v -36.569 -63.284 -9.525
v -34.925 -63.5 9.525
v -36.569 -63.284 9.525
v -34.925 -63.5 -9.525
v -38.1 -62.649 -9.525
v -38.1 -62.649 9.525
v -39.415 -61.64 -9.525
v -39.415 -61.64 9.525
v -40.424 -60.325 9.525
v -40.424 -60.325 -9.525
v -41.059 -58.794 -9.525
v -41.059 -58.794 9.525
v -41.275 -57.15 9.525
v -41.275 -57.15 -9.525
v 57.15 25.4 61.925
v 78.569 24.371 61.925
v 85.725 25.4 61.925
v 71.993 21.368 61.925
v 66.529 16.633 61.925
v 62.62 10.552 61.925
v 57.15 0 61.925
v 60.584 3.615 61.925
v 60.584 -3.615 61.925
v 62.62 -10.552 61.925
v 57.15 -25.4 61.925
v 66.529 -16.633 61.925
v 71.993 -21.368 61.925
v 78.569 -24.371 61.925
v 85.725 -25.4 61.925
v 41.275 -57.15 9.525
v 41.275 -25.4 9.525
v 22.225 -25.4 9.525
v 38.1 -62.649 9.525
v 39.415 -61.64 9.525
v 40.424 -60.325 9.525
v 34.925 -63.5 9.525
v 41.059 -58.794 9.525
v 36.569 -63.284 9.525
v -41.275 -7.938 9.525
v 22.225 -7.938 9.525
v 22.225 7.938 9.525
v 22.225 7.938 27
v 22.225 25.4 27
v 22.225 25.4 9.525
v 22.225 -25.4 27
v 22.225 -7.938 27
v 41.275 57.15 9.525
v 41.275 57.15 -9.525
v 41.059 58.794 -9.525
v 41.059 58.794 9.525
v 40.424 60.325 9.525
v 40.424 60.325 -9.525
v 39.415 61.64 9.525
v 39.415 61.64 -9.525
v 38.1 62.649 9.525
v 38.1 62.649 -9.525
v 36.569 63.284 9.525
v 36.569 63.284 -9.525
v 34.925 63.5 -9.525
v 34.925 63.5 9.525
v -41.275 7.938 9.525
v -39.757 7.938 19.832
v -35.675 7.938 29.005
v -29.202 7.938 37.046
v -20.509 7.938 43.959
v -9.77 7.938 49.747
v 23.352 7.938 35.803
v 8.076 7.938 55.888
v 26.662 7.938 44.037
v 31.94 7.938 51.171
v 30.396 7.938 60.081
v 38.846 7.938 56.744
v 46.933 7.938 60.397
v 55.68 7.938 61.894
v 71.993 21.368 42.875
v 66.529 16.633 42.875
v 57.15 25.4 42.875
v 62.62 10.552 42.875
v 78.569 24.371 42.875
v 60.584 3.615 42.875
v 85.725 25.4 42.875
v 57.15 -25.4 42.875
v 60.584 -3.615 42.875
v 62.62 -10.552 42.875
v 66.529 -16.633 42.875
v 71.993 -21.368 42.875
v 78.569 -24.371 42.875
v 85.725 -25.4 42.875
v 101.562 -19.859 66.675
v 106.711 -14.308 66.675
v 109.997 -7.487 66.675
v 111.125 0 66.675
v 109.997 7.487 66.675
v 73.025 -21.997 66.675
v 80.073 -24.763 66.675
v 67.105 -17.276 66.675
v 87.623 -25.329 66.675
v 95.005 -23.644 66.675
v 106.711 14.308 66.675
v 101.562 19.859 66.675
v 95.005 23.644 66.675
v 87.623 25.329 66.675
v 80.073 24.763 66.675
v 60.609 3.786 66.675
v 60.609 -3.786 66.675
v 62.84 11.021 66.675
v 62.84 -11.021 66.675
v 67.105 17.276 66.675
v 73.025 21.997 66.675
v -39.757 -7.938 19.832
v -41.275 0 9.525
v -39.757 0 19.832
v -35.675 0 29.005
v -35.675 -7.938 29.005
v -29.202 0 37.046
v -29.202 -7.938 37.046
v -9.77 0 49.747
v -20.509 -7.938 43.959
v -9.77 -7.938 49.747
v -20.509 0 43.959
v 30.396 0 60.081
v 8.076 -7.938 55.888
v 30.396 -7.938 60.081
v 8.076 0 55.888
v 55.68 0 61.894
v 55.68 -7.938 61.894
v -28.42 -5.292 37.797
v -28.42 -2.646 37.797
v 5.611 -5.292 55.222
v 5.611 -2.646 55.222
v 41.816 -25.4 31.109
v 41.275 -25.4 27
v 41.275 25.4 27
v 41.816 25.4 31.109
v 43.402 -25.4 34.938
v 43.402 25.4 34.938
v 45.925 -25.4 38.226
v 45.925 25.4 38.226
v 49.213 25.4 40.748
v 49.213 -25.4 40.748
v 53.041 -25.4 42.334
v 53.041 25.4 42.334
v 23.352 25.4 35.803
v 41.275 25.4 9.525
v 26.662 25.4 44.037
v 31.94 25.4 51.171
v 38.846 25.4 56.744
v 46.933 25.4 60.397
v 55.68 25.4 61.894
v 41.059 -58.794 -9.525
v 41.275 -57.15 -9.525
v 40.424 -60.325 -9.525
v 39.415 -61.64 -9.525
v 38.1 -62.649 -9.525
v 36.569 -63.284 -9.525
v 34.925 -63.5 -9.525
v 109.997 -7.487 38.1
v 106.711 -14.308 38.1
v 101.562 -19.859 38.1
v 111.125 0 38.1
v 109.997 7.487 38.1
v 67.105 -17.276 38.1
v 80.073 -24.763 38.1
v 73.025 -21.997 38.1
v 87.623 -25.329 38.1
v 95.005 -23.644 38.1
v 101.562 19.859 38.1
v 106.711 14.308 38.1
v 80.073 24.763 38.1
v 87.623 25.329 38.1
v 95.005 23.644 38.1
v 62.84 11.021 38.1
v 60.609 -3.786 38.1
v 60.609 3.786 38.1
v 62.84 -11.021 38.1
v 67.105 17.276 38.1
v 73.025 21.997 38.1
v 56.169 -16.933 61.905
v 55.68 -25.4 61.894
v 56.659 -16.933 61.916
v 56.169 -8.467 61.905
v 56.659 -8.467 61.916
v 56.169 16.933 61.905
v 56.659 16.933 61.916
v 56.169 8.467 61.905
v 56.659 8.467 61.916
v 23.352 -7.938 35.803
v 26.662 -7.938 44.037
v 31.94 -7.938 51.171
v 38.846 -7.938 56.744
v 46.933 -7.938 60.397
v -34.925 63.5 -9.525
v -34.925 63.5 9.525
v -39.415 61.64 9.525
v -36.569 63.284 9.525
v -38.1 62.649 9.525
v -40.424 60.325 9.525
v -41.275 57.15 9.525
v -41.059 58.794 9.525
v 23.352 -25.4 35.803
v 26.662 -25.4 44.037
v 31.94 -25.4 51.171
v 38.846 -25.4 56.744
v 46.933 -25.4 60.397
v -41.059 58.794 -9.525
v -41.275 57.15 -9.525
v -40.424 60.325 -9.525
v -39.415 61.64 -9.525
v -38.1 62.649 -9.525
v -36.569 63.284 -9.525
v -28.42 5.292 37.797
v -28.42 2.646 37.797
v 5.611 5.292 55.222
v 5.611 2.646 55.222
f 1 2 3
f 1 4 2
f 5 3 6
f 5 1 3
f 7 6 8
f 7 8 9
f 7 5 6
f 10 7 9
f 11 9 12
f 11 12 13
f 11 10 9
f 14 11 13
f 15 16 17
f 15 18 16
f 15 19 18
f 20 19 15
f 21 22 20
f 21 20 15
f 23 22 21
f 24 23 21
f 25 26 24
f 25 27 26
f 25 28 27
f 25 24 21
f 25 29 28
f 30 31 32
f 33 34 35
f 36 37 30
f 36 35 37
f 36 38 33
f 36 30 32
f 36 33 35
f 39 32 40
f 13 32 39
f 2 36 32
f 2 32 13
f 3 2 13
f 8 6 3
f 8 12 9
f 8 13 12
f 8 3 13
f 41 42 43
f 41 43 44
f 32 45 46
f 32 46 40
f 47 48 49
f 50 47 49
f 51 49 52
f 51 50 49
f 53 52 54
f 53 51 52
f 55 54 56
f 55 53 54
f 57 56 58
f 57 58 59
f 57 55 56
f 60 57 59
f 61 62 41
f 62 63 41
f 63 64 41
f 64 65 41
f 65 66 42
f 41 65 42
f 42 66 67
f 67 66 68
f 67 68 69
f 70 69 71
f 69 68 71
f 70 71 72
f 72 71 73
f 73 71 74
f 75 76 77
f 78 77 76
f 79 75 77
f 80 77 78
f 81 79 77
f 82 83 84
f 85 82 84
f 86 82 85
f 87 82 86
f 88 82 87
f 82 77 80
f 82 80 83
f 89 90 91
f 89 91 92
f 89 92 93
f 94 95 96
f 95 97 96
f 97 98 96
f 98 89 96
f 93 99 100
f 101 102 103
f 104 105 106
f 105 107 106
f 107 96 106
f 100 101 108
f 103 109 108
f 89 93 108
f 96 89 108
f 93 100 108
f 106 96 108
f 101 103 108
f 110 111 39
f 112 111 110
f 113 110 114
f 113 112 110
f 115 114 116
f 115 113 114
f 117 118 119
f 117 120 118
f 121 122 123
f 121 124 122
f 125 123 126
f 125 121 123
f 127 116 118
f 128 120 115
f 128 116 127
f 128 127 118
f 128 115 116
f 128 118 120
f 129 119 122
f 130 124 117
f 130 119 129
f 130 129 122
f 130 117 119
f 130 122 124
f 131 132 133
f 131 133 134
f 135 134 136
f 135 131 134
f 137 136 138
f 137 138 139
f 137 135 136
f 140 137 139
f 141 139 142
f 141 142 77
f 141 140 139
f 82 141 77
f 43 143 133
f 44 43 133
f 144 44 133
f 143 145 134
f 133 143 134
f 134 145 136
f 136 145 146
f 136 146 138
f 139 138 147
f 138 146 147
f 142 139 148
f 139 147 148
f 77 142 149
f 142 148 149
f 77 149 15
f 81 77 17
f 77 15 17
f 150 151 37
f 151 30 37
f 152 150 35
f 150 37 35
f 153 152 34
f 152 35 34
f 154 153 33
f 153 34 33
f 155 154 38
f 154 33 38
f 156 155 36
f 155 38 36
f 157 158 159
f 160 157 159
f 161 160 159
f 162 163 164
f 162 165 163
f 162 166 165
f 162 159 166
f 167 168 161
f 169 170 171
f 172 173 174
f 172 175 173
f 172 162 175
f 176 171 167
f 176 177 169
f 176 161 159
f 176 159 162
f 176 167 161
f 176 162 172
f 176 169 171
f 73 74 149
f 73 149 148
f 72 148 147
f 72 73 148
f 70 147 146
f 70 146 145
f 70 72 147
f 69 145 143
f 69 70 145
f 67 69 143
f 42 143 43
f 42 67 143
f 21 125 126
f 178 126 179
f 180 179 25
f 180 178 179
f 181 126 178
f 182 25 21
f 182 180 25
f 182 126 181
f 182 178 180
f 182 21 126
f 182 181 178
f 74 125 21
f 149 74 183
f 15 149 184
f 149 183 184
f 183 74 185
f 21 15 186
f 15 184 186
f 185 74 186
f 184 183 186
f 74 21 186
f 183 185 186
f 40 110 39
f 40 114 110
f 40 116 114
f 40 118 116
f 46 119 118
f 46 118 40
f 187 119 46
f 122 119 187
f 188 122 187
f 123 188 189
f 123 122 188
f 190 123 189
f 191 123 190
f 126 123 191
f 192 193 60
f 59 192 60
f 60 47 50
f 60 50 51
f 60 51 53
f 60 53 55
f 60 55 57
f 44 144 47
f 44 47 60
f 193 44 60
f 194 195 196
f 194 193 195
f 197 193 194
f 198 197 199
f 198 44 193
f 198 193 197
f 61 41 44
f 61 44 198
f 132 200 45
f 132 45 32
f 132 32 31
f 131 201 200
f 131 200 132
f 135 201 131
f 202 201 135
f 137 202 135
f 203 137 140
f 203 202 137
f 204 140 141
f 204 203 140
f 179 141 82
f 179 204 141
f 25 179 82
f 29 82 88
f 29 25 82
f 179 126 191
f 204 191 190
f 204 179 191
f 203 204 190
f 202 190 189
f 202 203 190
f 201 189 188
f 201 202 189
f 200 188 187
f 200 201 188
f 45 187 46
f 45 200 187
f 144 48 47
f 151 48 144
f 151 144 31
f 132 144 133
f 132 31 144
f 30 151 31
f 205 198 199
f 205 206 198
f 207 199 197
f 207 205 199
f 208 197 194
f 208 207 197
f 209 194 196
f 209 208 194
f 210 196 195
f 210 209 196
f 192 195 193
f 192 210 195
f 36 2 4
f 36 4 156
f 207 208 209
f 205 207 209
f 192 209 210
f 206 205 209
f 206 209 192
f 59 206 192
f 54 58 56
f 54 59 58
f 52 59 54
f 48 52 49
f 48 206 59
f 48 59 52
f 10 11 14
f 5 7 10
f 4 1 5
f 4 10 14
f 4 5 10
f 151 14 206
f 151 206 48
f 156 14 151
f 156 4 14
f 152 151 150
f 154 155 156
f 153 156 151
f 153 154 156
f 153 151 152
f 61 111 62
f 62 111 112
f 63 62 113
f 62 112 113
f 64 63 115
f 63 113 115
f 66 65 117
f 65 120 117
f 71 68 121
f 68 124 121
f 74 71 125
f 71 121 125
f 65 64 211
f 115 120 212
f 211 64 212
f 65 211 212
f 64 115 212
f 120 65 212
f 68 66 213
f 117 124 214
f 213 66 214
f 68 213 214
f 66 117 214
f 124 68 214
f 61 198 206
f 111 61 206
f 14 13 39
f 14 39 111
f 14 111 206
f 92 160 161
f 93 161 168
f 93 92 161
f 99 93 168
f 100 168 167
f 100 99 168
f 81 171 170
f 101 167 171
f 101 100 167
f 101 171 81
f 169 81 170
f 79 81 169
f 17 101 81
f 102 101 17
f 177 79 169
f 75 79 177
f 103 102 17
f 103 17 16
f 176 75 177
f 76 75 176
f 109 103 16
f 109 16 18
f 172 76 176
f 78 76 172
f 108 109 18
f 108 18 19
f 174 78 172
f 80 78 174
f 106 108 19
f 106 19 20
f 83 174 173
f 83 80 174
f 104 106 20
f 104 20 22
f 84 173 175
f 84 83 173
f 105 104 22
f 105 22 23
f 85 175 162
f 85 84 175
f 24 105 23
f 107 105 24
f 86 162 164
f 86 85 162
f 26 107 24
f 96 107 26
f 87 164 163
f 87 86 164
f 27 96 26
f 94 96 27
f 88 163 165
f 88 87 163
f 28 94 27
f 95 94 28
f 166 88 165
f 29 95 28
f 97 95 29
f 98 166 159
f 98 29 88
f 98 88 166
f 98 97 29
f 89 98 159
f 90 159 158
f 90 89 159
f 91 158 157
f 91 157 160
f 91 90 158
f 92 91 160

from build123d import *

# Parameters (mm, degrees)
F1_DEPTH = 63.5
F2_DEPTH = 25.4
F3_DEPTH = 25.4
F4_DEPTH = 7.9375
F0_W     = 25.4
F0_H     = 4.7498
F6_R     = 6.35


with BuildPart() as f1:
    # F0 (on Front) → F1 (new body, symmetric)
    with BuildSketch(Plane.XZ):
        Polygon((41.275, -9.525), (41.275, 9.525), (22.225, 9.525), (-41.275, 9.525), (-41.275, -9.525), align=None)
    extrude(amount=F1_DEPTH, both=True)

    # F0 (on Front) → F2 (join, symmetric)
    with BuildSketch(Plane.XZ):
        with BuildLine():
            Line((22.225, 9.525), (41.275, 9.525))
            Line((41.275, 9.525), (41.275, 27.0002))
            ThreePointArc((41.275, 27.0002), (45.9246798487, 38.2255201513), (57.15, 42.8752))
            Line((57.15, 42.8752), (60.325, 42.8752))
            Line((60.325, 42.8752), (60.325, 61.9252))
            Line((60.325, 61.9252), (57.15, 61.9252))
            add(Edge.make_bspline(
                [(55.6799774515, 61.8942490443), (56.1687606706, 61.9057674523), (56.6587732076, 61.9160843441), (57.15, 61.9252)],
                knots=[110.5461106931, 110.5461106931, 110.5461106931, 110.5461106931, 111.5045361635, 111.5045361635, 111.5045361635, 111.5045361635], degree=3))
            ThreePointArc((55.6799774515, 61.8942490443), (31.9399210383, 51.1705856764), (22.225, 27.0002))
            Line((22.225, 27.0002), (22.225, 9.525))
        make_face()
    extrude(amount=F2_DEPTH, both=True)

    # F0 (on Front) → F3 (join, symmetric)
    with BuildSketch(Plane.XZ):
        Polygon((60.325, 61.9252), (60.325, 42.8752), (85.725, 42.8752), (85.725, 52.3875), (85.725, 61.9252), align=None)
    extrude(amount=F3_DEPTH, both=True)

    # F0 (on Front) → F4 (join, symmetric)
    with BuildSketch(Plane.XZ):
        with BuildLine():
            Line((-41.275, 9.525), (22.225, 9.525))
            Line((22.225, 9.525), (22.225, 27.0002))
            ThreePointArc((22.225, 27.0002), (31.9399210383, 51.1705856764), (55.6799774515, 61.8942490443))
            add(Edge.make_bspline(
                [(-41.275, 9.525), (-40.7194862303, 43.2526218667), (-0.696950661, 60.5657000443), (55.6799774515, 61.8942490443)],
                knots=[0, 0, 0, 0, 110.5461106931, 110.5461106931, 110.5461106931, 110.5461106931], degree=3))
        make_face()
    extrude(amount=F4_DEPTH, both=True)

    # F0 (on Front) → F5 (revolve)
    with BuildSketch(Plane.XZ):
        Polygon((85.725, 52.3875), (85.725, 42.8752), (85.725, 38.1), (111.125, 38.1), (111.125, 61.9252), (85.725, 61.9252), align=None)
        with Locations((98.425, 64.3001)):
            Rectangle(F0_W, F0_H)
    revolve(axis=Axis((85.725, 0, 45.24375), (0, 0, 1)))

    # F6
    f6_edges = [f1.edges().sort_by_distance(p)[0] for p in [
        (-41.275, 63.5, 0),
        (-41.275, -63.5, 0),
        (41.275, -63.5, 0),
        (41.275, 63.5, 0),
    ]]
    fillet(f6_edges, radius=F6_R)


solid = f1.part
